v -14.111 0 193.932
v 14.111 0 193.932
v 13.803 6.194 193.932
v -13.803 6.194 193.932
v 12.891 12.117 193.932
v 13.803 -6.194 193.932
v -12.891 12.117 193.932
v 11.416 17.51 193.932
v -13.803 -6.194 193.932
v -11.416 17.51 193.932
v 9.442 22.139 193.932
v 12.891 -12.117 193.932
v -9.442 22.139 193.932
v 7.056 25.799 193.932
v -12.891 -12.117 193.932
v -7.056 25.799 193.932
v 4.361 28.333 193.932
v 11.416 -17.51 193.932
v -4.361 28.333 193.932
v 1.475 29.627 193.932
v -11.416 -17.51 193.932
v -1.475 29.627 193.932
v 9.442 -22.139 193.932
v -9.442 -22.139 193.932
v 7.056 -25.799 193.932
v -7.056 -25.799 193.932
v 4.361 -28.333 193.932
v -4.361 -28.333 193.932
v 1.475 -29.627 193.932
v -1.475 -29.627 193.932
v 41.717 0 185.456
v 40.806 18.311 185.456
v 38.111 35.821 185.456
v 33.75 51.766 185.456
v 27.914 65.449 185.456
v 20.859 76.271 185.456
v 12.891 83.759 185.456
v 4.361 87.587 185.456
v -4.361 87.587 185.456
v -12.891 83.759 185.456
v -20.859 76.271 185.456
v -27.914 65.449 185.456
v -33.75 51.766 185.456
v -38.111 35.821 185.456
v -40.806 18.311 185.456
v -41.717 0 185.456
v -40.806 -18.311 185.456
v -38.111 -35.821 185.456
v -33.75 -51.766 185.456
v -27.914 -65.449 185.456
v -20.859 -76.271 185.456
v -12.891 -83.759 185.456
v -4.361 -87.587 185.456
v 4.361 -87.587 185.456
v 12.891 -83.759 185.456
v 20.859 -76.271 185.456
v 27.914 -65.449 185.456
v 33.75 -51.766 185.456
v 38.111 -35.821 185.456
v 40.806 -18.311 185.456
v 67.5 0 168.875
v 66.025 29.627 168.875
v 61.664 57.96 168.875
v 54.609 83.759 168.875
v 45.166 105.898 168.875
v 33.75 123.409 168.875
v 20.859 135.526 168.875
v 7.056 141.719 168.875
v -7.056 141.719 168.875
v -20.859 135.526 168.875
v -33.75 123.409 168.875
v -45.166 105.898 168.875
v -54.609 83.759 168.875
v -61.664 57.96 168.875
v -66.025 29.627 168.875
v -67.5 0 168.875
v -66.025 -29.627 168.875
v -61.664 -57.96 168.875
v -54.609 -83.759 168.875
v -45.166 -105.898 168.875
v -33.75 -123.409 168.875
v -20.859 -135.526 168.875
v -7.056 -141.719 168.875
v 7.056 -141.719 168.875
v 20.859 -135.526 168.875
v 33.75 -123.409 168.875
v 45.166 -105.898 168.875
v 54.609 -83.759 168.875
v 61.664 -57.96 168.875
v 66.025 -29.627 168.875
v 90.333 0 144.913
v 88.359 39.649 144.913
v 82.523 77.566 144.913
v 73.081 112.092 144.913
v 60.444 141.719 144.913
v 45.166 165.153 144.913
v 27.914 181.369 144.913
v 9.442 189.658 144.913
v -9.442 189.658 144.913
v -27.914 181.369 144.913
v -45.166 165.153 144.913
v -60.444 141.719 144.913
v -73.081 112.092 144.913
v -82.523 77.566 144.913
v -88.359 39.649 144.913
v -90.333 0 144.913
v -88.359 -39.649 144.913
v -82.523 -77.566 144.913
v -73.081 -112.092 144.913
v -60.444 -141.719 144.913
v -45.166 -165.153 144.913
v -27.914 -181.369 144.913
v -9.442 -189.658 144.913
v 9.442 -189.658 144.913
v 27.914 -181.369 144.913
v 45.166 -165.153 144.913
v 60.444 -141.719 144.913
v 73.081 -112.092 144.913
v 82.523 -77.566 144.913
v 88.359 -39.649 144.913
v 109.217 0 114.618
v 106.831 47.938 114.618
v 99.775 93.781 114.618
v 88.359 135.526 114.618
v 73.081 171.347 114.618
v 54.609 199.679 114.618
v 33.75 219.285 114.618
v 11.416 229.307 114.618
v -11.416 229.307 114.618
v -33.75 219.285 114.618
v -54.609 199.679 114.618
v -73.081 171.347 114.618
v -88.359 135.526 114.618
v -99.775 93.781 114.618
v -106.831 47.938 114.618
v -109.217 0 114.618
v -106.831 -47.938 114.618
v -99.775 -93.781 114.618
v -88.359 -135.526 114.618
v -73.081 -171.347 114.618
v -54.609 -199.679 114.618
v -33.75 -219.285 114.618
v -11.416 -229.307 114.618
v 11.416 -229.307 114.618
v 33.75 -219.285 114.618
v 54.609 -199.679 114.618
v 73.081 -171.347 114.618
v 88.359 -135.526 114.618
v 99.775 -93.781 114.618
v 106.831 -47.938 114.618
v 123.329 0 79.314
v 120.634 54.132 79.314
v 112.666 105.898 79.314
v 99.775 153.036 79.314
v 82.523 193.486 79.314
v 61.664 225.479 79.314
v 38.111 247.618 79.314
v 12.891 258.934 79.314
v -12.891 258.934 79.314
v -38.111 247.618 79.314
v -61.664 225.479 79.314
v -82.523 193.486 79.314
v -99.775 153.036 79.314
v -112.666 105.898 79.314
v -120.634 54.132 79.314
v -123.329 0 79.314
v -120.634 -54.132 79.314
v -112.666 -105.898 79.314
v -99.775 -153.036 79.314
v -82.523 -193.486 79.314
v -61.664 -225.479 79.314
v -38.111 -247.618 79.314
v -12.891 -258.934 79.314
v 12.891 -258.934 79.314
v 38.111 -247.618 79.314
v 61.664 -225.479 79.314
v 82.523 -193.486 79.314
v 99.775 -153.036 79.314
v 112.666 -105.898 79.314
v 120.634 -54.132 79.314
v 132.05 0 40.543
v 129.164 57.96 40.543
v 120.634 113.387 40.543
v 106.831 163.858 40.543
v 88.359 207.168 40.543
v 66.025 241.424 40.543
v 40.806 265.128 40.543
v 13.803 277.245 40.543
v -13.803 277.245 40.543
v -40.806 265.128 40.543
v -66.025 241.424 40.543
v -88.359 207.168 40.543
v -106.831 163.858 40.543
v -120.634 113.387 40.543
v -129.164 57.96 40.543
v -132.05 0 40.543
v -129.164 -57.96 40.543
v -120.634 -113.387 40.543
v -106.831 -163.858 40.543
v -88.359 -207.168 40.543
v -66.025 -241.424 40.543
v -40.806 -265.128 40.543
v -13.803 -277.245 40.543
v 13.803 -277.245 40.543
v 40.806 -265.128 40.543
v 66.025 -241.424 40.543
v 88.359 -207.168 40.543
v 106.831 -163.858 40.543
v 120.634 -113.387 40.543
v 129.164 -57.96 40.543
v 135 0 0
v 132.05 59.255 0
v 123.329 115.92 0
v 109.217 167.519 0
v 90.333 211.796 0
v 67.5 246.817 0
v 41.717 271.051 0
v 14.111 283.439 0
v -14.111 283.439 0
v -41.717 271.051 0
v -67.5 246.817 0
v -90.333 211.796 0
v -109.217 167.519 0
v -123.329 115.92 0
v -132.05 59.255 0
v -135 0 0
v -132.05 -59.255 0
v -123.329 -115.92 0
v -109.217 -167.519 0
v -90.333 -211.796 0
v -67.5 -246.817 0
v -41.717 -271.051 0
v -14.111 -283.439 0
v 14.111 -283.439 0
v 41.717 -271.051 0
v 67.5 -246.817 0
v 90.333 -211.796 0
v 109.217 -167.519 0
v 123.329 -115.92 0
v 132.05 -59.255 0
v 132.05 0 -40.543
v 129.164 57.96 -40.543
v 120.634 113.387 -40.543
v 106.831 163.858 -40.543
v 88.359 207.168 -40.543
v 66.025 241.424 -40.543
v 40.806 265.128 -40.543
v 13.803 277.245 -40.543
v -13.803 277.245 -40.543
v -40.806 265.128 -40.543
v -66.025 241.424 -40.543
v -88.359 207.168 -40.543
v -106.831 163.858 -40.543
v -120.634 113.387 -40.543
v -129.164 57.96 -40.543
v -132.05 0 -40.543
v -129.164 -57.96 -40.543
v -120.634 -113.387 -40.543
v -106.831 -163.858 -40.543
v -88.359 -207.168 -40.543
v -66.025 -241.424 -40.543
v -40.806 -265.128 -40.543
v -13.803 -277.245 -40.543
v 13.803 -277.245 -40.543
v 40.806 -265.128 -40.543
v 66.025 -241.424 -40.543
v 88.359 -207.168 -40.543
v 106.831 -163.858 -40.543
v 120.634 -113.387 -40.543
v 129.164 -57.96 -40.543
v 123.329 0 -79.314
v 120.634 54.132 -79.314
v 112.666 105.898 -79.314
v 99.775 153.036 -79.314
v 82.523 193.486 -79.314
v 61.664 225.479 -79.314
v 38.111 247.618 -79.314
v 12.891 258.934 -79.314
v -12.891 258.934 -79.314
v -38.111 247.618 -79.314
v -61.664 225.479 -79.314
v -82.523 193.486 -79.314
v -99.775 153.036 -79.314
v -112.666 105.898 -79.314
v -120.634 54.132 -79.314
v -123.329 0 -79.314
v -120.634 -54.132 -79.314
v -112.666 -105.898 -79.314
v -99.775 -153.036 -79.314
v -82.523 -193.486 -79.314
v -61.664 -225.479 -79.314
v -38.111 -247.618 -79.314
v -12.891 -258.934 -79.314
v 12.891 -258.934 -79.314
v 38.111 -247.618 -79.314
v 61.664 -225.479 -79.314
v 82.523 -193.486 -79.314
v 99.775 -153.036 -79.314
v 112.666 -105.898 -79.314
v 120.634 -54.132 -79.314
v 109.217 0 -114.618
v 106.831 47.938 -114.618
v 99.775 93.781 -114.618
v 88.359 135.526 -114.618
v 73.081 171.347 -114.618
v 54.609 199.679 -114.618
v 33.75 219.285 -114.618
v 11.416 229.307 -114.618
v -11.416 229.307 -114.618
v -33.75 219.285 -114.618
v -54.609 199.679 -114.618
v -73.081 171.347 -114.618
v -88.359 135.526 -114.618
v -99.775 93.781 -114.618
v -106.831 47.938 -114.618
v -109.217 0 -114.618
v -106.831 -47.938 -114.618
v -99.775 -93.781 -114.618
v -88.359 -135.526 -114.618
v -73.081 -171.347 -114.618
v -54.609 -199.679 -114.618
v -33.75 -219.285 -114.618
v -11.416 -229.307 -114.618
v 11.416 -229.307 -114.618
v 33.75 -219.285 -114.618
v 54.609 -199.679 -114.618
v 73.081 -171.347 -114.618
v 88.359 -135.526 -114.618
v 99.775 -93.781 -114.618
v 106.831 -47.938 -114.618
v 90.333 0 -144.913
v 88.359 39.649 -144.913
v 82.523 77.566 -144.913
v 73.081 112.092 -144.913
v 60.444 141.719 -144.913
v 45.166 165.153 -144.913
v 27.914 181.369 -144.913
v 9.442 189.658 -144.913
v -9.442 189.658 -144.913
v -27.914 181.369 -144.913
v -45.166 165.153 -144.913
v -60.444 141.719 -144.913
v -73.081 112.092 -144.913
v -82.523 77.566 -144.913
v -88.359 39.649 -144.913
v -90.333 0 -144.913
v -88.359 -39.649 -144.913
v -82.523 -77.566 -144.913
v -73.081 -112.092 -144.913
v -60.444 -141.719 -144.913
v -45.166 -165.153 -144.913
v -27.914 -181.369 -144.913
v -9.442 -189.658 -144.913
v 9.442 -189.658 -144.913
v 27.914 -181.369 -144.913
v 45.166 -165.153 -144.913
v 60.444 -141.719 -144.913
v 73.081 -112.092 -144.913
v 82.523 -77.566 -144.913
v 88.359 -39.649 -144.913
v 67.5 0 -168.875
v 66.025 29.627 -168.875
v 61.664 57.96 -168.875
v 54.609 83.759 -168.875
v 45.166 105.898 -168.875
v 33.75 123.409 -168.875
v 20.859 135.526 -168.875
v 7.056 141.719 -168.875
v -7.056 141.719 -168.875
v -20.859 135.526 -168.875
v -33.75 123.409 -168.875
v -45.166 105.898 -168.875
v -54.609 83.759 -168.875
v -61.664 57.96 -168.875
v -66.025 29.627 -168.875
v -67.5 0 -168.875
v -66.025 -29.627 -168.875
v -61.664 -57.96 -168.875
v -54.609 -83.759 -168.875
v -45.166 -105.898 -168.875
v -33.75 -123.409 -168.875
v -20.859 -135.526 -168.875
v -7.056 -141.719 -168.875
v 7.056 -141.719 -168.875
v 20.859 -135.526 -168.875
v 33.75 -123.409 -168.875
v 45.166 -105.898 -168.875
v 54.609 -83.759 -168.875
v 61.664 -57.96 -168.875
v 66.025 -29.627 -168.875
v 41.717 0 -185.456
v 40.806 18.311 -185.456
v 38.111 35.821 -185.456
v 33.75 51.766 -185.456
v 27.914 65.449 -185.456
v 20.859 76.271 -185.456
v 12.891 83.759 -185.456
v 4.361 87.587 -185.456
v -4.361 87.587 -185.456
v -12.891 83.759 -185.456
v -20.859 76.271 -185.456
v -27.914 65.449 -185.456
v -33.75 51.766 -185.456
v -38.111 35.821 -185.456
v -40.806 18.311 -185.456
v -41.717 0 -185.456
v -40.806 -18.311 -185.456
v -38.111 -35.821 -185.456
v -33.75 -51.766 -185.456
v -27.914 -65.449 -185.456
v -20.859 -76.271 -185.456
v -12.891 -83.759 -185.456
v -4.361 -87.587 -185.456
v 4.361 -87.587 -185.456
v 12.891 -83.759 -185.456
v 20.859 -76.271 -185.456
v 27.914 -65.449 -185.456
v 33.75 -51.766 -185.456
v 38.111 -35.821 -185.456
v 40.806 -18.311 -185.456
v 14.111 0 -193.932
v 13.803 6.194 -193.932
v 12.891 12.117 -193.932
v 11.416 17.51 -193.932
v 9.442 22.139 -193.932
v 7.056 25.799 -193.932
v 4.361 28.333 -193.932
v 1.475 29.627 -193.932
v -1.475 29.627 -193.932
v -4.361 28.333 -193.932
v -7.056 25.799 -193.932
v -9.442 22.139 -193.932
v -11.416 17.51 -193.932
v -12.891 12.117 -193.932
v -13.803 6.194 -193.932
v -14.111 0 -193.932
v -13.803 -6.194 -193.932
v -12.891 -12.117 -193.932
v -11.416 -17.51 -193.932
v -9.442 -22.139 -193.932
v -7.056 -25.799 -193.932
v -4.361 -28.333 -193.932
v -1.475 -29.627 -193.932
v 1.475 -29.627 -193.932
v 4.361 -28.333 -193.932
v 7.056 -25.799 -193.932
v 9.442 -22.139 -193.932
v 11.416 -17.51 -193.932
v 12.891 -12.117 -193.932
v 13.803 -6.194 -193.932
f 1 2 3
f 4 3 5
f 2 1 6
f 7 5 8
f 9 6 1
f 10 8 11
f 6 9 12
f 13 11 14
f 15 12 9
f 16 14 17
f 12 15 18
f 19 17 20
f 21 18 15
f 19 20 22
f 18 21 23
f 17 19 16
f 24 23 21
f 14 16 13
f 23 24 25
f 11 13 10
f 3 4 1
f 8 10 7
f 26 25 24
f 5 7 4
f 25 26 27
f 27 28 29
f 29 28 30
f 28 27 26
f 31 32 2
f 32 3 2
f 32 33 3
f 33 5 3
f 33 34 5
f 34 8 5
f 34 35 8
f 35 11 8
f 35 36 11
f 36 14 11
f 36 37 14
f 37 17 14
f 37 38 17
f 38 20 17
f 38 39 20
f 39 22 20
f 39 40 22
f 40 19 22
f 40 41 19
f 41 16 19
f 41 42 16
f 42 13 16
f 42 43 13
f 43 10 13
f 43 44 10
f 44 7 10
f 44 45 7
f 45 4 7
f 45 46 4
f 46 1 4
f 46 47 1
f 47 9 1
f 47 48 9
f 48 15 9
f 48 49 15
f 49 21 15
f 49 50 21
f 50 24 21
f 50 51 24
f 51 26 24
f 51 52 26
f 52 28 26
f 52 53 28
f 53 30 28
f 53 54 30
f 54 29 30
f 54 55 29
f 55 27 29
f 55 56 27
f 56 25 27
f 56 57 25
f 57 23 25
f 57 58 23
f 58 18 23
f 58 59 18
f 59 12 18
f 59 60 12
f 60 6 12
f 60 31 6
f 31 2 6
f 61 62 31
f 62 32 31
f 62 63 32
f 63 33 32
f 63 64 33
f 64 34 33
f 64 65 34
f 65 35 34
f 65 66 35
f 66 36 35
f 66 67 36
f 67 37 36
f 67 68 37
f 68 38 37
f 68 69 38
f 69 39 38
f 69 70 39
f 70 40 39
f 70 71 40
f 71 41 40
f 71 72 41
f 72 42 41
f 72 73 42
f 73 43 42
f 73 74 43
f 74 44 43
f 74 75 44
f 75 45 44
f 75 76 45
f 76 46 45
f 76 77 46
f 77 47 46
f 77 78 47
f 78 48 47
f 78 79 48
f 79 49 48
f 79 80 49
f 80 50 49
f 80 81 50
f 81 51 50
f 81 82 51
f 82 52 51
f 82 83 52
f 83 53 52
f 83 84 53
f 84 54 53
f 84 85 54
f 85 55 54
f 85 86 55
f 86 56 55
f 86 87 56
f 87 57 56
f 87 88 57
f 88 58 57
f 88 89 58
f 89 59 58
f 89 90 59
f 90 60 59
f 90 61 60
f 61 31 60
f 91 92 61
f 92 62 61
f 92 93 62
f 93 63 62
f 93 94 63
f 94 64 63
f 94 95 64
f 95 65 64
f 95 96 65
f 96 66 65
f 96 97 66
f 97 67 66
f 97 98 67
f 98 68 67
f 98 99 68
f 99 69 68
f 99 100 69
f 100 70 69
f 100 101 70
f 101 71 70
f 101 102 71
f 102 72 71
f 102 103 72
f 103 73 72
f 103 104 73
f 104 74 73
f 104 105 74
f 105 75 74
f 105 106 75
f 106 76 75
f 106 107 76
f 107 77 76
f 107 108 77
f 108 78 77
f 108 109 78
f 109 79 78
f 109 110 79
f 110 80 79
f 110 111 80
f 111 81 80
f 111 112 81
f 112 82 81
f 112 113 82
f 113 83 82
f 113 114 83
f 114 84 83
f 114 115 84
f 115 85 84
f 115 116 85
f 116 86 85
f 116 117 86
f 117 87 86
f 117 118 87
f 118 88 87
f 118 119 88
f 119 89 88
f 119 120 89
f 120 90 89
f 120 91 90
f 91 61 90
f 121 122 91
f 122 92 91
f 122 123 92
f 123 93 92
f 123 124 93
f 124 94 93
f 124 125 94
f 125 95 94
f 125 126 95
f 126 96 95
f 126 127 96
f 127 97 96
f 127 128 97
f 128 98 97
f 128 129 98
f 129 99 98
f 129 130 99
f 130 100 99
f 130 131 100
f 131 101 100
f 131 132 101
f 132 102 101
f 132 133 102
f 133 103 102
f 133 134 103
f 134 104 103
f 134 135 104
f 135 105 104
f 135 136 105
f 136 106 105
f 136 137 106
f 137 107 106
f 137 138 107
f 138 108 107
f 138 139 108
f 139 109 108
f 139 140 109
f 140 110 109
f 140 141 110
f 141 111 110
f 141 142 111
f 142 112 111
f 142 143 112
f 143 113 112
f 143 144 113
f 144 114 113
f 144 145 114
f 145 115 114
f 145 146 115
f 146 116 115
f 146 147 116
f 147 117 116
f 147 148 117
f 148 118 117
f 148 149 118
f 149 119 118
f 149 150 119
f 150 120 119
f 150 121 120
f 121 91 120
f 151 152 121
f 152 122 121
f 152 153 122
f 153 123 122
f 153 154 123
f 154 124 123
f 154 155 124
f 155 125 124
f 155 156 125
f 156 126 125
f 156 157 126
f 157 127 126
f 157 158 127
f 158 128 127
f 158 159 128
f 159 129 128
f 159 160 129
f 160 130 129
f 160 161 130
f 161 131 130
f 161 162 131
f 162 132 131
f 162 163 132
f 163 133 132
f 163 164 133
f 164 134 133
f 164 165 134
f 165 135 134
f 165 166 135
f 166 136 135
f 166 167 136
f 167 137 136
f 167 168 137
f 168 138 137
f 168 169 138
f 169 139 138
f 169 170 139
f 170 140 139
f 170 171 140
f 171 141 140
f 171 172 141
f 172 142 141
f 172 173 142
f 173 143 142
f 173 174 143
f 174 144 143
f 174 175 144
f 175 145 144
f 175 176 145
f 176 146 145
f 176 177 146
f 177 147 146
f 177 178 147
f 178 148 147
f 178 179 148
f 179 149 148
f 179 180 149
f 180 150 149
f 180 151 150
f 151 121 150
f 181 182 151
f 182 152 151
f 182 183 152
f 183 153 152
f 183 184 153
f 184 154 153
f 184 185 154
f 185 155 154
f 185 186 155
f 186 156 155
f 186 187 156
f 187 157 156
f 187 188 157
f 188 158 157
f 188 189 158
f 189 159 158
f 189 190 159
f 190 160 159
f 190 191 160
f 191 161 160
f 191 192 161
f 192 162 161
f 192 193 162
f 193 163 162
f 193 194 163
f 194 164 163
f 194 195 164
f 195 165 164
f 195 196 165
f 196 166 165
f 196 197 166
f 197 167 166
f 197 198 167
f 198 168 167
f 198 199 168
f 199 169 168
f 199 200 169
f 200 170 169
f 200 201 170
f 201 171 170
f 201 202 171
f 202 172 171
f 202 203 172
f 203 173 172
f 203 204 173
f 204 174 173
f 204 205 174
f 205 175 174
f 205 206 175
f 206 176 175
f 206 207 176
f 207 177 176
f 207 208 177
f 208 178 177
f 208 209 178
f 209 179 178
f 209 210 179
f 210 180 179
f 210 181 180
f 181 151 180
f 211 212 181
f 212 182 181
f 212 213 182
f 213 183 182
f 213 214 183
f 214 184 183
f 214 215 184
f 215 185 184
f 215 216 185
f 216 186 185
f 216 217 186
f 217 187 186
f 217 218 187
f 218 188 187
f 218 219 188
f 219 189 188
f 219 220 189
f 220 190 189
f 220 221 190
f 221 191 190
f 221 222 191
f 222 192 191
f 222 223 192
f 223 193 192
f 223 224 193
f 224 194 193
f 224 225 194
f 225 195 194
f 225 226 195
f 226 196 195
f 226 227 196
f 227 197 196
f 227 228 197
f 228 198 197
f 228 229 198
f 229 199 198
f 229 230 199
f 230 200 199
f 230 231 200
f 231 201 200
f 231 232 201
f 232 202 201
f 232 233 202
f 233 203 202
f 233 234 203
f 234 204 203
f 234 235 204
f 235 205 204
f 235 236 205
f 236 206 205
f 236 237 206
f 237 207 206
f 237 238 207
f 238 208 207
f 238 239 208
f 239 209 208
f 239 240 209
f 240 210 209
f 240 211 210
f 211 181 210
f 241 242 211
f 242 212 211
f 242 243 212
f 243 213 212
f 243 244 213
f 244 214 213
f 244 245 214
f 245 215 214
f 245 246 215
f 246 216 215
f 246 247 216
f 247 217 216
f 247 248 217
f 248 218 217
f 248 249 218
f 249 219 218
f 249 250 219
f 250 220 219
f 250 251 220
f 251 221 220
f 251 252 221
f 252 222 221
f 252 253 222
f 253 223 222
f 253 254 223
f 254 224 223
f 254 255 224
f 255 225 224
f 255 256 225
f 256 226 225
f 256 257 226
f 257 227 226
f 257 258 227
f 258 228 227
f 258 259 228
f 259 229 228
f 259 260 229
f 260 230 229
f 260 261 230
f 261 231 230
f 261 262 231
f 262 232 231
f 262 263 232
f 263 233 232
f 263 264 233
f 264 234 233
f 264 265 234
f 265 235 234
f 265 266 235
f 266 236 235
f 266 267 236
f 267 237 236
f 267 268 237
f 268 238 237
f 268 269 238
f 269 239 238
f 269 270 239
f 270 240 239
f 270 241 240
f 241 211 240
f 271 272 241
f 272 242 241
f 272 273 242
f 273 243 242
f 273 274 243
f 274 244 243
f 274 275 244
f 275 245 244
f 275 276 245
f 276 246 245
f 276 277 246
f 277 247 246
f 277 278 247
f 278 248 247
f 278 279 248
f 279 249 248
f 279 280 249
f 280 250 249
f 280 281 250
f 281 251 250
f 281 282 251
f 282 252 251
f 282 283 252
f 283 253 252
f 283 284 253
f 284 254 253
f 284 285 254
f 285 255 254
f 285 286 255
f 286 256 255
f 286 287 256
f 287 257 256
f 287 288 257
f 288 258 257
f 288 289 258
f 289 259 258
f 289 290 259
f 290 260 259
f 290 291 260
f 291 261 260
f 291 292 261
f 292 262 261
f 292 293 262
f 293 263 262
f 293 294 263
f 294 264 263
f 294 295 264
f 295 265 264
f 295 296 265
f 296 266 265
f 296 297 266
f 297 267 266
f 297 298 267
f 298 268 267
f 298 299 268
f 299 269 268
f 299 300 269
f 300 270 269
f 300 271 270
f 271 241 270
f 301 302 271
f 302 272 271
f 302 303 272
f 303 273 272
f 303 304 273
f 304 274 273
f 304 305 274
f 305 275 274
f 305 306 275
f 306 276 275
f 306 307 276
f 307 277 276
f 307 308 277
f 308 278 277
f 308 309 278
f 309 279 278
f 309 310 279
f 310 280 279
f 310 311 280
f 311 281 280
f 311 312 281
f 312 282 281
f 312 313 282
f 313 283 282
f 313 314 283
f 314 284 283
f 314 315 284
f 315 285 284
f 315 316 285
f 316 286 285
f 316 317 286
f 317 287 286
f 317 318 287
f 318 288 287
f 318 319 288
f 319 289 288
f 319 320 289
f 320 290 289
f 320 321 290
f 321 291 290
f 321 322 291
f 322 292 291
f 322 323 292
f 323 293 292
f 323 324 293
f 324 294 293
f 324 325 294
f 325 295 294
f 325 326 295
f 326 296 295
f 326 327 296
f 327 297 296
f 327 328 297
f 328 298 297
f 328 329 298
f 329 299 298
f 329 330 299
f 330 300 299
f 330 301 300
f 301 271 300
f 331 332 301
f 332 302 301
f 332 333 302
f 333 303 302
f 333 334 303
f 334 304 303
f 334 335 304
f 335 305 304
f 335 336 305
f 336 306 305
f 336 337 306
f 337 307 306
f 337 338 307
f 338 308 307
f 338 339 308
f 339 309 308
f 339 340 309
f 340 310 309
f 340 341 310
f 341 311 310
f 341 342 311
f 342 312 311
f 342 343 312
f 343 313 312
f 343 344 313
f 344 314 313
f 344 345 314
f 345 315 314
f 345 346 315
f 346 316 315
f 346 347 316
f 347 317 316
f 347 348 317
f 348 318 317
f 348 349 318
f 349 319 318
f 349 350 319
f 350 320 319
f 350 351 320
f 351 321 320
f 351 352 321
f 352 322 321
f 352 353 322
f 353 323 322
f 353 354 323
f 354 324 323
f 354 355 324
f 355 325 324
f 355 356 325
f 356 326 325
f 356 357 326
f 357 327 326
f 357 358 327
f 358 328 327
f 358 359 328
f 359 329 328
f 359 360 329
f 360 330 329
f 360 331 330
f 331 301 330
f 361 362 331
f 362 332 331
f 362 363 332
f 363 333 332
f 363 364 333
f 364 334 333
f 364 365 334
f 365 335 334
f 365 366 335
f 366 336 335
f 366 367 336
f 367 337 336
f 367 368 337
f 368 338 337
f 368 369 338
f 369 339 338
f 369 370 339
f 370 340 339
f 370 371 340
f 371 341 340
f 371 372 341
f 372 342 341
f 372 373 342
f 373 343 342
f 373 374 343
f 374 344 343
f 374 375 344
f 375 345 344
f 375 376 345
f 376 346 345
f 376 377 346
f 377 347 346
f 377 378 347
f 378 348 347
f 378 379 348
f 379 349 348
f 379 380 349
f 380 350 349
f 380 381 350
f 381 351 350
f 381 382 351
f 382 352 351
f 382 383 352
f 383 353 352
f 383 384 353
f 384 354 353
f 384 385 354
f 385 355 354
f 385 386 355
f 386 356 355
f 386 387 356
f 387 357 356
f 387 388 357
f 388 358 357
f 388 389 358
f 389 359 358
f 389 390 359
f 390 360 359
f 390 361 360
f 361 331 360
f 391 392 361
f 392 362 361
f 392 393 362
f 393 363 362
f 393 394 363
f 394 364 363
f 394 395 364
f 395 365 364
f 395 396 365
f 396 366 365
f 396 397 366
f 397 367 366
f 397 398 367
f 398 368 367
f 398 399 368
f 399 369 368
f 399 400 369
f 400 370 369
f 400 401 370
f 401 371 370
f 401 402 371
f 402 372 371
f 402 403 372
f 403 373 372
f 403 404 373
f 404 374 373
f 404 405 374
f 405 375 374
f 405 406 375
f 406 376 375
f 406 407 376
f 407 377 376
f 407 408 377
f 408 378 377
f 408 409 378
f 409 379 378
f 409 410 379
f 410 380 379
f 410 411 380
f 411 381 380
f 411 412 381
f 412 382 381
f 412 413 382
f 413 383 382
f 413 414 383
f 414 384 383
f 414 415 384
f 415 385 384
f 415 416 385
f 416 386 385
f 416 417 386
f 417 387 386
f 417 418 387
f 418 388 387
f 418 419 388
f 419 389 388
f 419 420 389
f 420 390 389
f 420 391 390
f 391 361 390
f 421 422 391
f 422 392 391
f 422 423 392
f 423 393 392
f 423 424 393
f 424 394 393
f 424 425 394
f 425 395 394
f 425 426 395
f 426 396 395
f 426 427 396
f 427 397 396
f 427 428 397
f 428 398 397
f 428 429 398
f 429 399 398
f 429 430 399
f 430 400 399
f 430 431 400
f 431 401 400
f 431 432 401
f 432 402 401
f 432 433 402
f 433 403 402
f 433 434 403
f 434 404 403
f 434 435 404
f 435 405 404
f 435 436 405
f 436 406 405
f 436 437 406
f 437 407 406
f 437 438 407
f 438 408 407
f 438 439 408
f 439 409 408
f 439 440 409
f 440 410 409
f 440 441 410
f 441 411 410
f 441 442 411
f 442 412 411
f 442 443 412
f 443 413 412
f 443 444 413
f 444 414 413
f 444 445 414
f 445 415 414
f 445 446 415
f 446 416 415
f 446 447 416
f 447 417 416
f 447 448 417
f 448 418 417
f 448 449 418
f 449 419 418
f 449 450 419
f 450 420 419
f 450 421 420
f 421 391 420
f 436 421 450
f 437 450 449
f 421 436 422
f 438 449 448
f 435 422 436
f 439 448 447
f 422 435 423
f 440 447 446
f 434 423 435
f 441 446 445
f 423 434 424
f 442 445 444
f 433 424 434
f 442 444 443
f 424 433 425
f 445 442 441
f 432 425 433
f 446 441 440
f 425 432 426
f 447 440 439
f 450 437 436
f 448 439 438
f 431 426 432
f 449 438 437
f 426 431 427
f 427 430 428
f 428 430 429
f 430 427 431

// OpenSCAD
// Generated by SolidPython 1.0.1 on 2020-07-29 00:46:49


scale(v = [9, 19, 13]) {
	sphere(r = 15);
}
/***********************************************
*********      SolidPython code:      **********
************************************************
 
# import packages: SolidPython
from solid import *
from solid.utils import *
from itertools import chain, combinations, permutations


class Resize:

    def __init__(self, scad_file):
        self.scad_file = scad_file
        #self.scad_file = import_scad(scad_file)
        # cone/cylinder param:
        self.r1 = 0
        self.r2 = 0
        self.h = 0
        # rectangular prism param:
        self.w = 0
        self.l = 0
        # ellipse param:
        self.r = 0

    # import OpenScad code (file name corresponds to shape)


    # classify shape + parameters
    def assign(self, param1, param2, param3):
        if self.scad_file == 'cone.scad':
            self.r1 = param1
            self.r2 = param2
            self.h = param3
        elif self.scad_file == 'cylinder.scad':
            self.r1 = param1
            self.r2 = param2
            self.h = param3
        elif self.scad_file == 'rectangularPrism.scad':
            self.h = param1
            self.l = param2
            self.w = param3
        else:
            self.r = param1
            self.h = param2

    # resize parameters
    def iterate(self):
        x = range(3, 20, 2)
        i = 1
        if self.scad_file == 'cone.scad':
            tempList = list(permutations(x, 2))
            for temp in tempList:
                param1 = temp[0]
                param2 = temp[1]
                filepath = 'produced_scad_files/' + 'cone' + str(param1) + '_' + str(param2) + '_' + '.scad'
                scad_render_to_file(cylinder(h=param1, r1=param2, r2=0), filepath)

        elif self.scad_file == 'cylinder.scad':
            tempList = list(permutations(x, 3))
            for temp in tempList:
                param1 = temp[0]
                param2 = temp[1]
                filepath = 'produced_scad_files/' + 'cylinder' + str(param1) + '_' + str(param2) + '_' + '.scad'
                scad_render_to_file(cylinder(h=param1, r1=param2, r2=param2), filepath)

        elif self.scad_file == 'rectangularPrism.scad':
            tempList = list(permutations(x, 3))
            for temp in tempList:
                param1 = temp[0]
                param2 = temp[1]
                param3 = temp[2]
                filepath = 'produced_scad_files/' + 'rectangularPrism' + str(param1) + '_' + str(param2) + '_' + str(
                    param3) + '.scad'
                scad_render_to_file(cube(size=(param1, param2, param3)), filepath)

        elif self.scad_file == 'ellipse.scad':
            tempList = list(permutations(x, 4))
            for temp in tempList:
                param1 = temp[0]
                param2 = temp[1]
                param3 = temp[2]
                param4 = temp[3]
                filepath = 'produced_scad_files/' + 'ellipse' + str(param1) + '_' + str(param2) + '_' + str(param3) + '_' + str(param4) + '.scad'
                scad_render_to_file(scale([param1, param2, param3])(sphere(r=param4)), filepath)

    def render_to_scadfile(self):
        scad_render_to_file(scad, 'example.scad') 
 
************************************************/
